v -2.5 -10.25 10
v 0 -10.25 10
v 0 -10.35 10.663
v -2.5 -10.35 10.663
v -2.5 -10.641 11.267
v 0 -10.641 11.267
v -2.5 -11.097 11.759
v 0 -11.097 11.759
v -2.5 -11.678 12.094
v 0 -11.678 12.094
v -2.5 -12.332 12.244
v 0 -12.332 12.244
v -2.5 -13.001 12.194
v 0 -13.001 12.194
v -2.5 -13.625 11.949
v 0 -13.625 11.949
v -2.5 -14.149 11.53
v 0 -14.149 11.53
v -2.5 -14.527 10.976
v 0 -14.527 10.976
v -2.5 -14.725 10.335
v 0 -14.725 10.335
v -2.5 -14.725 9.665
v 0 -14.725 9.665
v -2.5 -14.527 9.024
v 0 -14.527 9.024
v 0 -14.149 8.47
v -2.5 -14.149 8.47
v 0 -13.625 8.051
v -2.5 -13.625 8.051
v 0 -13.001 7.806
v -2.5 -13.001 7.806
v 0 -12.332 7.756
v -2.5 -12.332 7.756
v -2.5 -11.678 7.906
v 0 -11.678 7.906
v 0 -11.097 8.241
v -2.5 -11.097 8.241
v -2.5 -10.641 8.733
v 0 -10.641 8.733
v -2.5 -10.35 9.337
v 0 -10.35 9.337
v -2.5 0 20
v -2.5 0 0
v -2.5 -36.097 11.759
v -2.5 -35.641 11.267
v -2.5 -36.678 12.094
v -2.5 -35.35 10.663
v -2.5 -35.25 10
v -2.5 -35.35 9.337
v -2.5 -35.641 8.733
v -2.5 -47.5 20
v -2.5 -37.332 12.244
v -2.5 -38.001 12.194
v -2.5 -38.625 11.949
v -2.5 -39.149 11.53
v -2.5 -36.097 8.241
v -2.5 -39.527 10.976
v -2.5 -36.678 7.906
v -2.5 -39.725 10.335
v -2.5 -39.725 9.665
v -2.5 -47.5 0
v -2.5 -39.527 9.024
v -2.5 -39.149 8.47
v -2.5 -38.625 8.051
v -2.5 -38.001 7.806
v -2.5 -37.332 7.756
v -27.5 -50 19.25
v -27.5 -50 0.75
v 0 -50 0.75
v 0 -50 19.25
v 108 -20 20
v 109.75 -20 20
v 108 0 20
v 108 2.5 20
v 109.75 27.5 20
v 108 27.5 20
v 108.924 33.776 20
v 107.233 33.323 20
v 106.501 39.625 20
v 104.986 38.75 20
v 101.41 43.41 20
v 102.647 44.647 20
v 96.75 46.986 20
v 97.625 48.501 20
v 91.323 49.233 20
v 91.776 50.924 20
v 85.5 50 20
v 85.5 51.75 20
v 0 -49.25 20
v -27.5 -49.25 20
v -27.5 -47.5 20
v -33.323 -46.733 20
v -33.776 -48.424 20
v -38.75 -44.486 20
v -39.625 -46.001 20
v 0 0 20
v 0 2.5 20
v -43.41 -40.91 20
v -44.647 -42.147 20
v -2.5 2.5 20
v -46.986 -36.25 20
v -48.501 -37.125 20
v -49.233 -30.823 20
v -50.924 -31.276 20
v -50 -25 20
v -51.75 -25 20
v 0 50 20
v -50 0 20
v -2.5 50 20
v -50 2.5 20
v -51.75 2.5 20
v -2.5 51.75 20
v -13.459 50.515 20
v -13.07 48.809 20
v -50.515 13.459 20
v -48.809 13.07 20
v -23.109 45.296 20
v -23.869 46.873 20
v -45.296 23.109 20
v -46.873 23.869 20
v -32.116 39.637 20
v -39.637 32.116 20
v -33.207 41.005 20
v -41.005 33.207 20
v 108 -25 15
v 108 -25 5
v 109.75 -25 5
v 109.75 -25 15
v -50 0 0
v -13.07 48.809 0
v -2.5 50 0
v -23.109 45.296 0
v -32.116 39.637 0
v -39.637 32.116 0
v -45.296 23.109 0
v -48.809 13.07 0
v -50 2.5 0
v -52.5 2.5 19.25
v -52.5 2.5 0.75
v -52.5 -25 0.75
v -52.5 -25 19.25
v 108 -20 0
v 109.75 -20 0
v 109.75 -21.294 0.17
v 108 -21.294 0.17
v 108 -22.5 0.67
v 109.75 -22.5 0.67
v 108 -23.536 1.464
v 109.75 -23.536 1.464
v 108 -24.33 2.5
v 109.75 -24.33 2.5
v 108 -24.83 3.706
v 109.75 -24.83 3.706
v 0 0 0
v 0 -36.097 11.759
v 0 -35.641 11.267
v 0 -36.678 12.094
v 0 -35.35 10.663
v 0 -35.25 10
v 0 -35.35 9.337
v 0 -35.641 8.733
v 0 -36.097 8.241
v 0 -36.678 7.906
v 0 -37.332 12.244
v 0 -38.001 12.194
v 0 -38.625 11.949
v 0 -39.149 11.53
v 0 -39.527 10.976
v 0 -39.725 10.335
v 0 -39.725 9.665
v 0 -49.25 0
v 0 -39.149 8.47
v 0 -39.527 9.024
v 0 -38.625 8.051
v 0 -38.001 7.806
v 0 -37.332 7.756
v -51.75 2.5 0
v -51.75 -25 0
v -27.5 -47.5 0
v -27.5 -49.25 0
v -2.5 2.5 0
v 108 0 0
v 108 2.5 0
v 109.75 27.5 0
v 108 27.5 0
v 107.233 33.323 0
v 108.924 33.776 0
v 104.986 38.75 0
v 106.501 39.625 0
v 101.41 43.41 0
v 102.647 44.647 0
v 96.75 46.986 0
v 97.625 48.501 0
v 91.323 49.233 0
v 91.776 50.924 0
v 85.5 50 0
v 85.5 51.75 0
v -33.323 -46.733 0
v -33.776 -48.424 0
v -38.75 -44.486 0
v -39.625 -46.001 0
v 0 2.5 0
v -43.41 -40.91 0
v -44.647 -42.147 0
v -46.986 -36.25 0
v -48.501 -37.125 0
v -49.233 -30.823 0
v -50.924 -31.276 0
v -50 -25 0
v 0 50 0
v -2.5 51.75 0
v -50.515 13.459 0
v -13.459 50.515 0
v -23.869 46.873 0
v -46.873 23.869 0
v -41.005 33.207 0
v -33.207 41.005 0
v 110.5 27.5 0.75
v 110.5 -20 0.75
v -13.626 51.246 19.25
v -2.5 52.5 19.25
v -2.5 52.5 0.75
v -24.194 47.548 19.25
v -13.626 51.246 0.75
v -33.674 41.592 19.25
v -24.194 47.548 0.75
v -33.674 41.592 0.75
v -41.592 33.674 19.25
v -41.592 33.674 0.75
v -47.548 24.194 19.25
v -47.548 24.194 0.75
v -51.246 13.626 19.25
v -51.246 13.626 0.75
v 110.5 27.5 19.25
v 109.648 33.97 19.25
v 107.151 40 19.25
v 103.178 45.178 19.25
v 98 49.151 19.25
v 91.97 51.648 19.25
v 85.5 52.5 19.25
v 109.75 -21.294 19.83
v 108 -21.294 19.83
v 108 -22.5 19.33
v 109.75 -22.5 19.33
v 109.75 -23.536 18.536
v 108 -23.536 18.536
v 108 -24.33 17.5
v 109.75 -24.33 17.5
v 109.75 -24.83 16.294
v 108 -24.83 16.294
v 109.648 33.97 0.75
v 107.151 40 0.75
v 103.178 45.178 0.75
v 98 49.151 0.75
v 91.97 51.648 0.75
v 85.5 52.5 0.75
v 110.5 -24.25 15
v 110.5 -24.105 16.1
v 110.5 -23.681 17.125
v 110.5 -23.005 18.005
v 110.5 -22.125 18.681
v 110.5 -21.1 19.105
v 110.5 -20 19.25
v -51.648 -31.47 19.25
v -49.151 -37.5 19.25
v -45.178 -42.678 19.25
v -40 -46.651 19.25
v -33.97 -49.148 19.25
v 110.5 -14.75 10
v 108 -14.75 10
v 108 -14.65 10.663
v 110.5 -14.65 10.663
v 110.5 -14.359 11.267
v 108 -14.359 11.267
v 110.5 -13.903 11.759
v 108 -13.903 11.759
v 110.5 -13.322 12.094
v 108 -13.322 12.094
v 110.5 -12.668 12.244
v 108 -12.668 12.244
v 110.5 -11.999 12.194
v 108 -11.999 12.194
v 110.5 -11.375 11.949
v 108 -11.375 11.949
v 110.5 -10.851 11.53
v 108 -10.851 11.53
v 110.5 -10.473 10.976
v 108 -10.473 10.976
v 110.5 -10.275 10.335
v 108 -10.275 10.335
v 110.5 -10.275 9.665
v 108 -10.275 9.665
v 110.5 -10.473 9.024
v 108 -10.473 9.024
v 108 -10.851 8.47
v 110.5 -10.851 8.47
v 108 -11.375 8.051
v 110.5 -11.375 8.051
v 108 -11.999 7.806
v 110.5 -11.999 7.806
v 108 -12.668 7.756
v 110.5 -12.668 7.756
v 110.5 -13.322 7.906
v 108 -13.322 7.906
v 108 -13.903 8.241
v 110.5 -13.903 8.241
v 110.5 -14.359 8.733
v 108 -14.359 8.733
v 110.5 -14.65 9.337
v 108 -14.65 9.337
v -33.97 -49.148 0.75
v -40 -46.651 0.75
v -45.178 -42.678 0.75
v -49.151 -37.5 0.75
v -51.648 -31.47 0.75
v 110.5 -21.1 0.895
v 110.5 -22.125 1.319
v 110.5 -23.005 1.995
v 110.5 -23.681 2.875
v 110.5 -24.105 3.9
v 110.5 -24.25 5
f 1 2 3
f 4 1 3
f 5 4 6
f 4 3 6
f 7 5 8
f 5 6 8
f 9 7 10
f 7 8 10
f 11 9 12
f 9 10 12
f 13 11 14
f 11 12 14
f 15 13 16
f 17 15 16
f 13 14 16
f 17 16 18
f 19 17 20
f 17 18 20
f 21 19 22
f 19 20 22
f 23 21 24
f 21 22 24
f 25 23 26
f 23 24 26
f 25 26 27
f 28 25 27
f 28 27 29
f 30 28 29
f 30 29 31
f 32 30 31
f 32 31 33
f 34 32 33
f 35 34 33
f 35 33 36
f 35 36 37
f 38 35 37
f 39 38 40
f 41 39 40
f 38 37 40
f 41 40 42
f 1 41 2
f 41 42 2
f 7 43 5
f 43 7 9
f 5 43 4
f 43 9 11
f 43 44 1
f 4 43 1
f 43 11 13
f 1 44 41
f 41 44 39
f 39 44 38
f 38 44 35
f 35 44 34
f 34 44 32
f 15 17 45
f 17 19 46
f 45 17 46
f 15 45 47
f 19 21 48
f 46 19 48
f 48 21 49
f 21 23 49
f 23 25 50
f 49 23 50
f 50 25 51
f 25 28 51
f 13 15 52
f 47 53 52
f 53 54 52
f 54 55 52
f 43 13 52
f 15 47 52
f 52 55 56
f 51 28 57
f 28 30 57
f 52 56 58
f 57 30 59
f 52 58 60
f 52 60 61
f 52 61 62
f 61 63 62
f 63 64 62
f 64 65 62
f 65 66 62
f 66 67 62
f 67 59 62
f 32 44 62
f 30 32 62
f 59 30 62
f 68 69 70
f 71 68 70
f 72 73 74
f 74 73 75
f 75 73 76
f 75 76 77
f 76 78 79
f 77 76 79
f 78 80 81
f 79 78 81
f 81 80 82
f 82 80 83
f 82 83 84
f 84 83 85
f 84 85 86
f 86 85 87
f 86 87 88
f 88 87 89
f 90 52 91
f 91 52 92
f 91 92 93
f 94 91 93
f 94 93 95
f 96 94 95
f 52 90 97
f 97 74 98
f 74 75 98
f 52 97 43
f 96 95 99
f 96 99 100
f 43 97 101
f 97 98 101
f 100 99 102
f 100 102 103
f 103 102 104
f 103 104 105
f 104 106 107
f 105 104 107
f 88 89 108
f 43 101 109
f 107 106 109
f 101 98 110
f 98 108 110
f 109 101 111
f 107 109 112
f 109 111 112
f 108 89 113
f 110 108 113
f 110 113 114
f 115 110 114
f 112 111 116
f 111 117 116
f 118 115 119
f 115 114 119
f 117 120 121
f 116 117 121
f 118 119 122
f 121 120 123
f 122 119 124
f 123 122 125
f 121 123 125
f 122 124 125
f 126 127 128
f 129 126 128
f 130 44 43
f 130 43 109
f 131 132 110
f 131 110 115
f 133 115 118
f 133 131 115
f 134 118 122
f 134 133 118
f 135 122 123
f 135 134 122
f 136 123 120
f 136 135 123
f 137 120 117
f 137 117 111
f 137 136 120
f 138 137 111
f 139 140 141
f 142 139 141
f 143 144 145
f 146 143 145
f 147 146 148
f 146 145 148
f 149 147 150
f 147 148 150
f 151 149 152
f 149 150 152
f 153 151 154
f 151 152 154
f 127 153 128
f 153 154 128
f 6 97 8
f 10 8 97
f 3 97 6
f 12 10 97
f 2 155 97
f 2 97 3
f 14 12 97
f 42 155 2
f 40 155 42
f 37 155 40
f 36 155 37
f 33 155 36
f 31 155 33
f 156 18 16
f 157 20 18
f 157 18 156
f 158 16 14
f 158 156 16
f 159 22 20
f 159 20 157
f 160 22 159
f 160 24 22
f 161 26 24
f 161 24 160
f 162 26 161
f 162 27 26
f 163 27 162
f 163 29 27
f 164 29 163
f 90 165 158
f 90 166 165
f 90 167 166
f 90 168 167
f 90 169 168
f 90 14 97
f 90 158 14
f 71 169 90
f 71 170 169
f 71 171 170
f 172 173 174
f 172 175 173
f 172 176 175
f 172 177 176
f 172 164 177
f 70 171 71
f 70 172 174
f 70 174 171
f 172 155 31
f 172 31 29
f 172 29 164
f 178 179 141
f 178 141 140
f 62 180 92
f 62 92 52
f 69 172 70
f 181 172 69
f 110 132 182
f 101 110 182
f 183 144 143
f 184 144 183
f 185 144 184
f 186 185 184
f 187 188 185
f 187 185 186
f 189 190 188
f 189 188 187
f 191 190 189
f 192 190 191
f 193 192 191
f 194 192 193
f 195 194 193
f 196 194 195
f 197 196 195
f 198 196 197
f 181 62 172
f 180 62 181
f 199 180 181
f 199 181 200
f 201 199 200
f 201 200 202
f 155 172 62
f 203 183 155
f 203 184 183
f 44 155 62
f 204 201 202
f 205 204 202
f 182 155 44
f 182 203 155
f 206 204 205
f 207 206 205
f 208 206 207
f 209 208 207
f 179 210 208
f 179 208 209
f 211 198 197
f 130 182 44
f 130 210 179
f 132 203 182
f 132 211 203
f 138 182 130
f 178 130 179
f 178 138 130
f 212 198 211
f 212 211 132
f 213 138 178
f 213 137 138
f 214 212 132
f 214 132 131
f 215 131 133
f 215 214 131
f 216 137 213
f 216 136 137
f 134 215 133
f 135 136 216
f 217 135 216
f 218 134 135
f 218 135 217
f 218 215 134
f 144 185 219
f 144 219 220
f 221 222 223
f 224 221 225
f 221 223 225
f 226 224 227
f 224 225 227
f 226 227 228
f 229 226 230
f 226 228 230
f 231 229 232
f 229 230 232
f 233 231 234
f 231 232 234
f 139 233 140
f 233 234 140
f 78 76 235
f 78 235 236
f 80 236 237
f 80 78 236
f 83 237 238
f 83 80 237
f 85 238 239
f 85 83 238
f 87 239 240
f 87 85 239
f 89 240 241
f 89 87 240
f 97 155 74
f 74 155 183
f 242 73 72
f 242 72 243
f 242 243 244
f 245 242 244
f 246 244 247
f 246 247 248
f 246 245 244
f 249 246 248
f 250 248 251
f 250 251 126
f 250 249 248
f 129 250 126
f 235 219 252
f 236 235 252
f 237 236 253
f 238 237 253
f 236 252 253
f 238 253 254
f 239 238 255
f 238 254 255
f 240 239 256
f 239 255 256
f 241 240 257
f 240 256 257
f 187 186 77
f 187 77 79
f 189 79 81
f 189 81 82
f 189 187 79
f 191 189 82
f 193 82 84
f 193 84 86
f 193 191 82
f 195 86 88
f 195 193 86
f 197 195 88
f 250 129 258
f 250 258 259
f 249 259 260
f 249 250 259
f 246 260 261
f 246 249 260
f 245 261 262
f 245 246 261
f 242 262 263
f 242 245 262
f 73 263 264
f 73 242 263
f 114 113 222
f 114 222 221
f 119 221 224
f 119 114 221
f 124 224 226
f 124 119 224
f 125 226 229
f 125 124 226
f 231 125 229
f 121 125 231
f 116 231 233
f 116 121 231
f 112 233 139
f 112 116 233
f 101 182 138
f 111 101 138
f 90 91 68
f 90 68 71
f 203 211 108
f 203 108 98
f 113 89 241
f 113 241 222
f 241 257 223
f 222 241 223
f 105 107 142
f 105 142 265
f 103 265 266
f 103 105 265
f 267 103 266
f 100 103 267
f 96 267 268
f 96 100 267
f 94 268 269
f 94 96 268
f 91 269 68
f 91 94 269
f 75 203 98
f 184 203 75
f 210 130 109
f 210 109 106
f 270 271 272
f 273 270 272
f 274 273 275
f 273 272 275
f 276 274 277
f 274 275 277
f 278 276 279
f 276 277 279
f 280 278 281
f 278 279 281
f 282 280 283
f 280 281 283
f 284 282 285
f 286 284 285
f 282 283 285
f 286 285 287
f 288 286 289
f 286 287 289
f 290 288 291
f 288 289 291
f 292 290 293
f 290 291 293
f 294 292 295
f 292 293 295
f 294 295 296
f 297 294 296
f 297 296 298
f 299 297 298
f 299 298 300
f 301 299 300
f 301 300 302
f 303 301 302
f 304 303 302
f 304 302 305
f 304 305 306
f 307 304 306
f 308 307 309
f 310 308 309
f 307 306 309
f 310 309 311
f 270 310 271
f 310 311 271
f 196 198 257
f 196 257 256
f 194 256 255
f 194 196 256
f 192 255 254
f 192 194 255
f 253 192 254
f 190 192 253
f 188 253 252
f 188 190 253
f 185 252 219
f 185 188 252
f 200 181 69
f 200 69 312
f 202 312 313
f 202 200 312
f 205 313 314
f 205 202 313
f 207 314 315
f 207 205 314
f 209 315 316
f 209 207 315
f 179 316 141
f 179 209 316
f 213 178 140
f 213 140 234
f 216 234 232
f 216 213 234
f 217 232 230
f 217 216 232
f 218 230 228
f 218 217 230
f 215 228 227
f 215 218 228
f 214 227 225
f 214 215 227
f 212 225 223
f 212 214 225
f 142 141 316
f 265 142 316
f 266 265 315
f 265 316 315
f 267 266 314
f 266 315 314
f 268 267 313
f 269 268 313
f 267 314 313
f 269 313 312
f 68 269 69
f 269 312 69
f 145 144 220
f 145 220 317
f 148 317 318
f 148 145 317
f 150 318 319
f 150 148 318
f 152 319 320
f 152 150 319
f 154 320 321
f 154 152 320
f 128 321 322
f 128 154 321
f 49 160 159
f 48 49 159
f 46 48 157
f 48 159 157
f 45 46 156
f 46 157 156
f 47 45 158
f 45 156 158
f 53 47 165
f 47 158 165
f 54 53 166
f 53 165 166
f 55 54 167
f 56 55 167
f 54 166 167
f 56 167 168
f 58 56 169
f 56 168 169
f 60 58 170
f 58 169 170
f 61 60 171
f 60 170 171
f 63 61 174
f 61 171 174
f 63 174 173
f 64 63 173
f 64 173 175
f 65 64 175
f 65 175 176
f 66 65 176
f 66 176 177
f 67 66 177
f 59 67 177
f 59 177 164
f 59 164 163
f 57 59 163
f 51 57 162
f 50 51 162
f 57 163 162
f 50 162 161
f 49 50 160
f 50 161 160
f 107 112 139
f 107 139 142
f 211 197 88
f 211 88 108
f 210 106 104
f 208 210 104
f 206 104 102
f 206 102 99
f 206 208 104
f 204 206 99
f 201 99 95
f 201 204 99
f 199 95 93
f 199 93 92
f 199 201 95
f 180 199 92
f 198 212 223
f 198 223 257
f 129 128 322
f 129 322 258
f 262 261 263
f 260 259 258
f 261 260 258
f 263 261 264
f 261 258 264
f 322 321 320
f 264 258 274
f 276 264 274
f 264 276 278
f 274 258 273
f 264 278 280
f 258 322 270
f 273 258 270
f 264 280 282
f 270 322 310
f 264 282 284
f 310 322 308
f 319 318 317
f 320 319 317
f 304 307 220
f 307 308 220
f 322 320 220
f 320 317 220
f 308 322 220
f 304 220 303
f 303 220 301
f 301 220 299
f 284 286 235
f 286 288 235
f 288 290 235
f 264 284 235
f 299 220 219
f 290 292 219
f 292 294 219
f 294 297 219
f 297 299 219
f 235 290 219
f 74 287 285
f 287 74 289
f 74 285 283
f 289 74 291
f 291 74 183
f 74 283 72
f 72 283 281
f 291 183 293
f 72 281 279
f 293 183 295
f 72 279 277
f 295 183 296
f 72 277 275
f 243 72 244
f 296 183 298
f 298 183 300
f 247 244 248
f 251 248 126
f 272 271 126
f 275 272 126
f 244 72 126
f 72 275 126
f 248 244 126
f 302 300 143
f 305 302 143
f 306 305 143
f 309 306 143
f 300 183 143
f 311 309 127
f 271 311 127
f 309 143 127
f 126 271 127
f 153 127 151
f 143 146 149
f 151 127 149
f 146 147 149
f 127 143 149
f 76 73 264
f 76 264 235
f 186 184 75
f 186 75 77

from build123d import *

# Parameters (mm, degrees)
PAD_DEPTH       = 20
SKETCH001_R     = 2.25
POCKET_DEPTH    = 2.5
SKETCH002_R     = 2.25
POCKET001_DEPTH = 2.5
FILLET_R        = 5
CHAMFER_SIZE    = 0.75


with BuildPart() as part:
    # Sketch → Pad (new body)
    with BuildSketch(Plane.XY):
        with BuildLine():
            Line((0, 0), (0, -50))
            Line((-27.500003, -50), (0, -50))
            ThreePointArc((-52.5, -25.000001), (-45.17767, -42.677669), (-27.500003, -50))
            Line((-52.5, -25.000001), (-52.5, 0))
            Line((-52.5, 2.5), (-52.5, 0))
            ThreePointArc((-2.5, 52.5), (-37.855339, 37.855339), (-52.5, 2.5))
            Line((0, 52.5), (-2.5, 52.5))
            Line((85.499965, 52.5), (0, 52.5))
            ThreePointArc((110.5, 27.499999), (103.177657, 45.177682), (85.499965, 52.5))
            Line((110.5, -25), (110.5, 27.499999))
            Line((108, -25), (110.5, -25))
            Line((108, 0), (108, -25))
            Line((0, 0), (108, 0))
        make_face()
        with BuildLine():
            Line((-2.5, 0), (-2.5, -47.5))
            Line((-27.5, -47.5), (-2.5, -47.5))
            ThreePointArc((-50, -25), (-43.409903, -40.909903), (-27.5, -47.5))
            Line((-50, 0), (-50, -25))
            Line((-2.5, 0), (-50, 0))
        make_face(mode=Mode.SUBTRACT)
        with BuildLine():
            Line((0, 2.5), (108, 2.5))
            Line((108, 2.5), (108, 27.5))
            ThreePointArc((108, 27.5), (101.409903, 43.409903), (85.5, 50))
            Line((85.5, 50), (0, 50))
            Line((0, 50), (0, 2.5))
        make_face(mode=Mode.SUBTRACT)
        with BuildLine():
            ThreePointArc((-2.5, 50), (-36.087572, 36.087572), (-50, 2.5))
            Line((-2.5, 2.5), (-50, 2.5))
            Line((-2.5, 50), (-2.5, 2.5))
        make_face(mode=Mode.SUBTRACT)
    extrude(amount=PAD_DEPTH)

    # Sketch001 (on Face7 of Pad) → Pocket (cut)
    with BuildSketch(Plane.YZ):
        with Locations((-37.5, 10)):
            Circle(SKETCH001_R)
        with Locations((-12.5, 10)):
            Circle(SKETCH001_R)
    extrude(amount=-POCKET_DEPTH, mode=Mode.SUBTRACT)

    # Sketch002 (on Face5 of Pad) → Pocket001 (cut)
    with BuildSketch(Plane(origin=(108, 0, 0), x_dir=(0, -1, 0), z_dir=(-1, 0, 0))):
        with Locations((12.5, 10)):
            Circle(SKETCH002_R)
    extrude(amount=-POCKET001_DEPTH, mode=Mode.SUBTRACT)

    # Fillet
    fillet_edges = [part.edges().sort_by_distance(p)[0] for p in [
        (109.25, -25, 0),
        (109.25, -25, 20),
    ]]
    fillet(fillet_edges, radius=FILLET_R)

    # Chamfer
    chamfer_edges = [part.edges().sort_by_distance(p)[0] for p in [
        (-37.855339, 37.855339, 20),
        (-37.855339, 37.855339, 0),
    ]]
    chamfer(chamfer_edges, length=CHAMFER_SIZE)


solid = part.part
